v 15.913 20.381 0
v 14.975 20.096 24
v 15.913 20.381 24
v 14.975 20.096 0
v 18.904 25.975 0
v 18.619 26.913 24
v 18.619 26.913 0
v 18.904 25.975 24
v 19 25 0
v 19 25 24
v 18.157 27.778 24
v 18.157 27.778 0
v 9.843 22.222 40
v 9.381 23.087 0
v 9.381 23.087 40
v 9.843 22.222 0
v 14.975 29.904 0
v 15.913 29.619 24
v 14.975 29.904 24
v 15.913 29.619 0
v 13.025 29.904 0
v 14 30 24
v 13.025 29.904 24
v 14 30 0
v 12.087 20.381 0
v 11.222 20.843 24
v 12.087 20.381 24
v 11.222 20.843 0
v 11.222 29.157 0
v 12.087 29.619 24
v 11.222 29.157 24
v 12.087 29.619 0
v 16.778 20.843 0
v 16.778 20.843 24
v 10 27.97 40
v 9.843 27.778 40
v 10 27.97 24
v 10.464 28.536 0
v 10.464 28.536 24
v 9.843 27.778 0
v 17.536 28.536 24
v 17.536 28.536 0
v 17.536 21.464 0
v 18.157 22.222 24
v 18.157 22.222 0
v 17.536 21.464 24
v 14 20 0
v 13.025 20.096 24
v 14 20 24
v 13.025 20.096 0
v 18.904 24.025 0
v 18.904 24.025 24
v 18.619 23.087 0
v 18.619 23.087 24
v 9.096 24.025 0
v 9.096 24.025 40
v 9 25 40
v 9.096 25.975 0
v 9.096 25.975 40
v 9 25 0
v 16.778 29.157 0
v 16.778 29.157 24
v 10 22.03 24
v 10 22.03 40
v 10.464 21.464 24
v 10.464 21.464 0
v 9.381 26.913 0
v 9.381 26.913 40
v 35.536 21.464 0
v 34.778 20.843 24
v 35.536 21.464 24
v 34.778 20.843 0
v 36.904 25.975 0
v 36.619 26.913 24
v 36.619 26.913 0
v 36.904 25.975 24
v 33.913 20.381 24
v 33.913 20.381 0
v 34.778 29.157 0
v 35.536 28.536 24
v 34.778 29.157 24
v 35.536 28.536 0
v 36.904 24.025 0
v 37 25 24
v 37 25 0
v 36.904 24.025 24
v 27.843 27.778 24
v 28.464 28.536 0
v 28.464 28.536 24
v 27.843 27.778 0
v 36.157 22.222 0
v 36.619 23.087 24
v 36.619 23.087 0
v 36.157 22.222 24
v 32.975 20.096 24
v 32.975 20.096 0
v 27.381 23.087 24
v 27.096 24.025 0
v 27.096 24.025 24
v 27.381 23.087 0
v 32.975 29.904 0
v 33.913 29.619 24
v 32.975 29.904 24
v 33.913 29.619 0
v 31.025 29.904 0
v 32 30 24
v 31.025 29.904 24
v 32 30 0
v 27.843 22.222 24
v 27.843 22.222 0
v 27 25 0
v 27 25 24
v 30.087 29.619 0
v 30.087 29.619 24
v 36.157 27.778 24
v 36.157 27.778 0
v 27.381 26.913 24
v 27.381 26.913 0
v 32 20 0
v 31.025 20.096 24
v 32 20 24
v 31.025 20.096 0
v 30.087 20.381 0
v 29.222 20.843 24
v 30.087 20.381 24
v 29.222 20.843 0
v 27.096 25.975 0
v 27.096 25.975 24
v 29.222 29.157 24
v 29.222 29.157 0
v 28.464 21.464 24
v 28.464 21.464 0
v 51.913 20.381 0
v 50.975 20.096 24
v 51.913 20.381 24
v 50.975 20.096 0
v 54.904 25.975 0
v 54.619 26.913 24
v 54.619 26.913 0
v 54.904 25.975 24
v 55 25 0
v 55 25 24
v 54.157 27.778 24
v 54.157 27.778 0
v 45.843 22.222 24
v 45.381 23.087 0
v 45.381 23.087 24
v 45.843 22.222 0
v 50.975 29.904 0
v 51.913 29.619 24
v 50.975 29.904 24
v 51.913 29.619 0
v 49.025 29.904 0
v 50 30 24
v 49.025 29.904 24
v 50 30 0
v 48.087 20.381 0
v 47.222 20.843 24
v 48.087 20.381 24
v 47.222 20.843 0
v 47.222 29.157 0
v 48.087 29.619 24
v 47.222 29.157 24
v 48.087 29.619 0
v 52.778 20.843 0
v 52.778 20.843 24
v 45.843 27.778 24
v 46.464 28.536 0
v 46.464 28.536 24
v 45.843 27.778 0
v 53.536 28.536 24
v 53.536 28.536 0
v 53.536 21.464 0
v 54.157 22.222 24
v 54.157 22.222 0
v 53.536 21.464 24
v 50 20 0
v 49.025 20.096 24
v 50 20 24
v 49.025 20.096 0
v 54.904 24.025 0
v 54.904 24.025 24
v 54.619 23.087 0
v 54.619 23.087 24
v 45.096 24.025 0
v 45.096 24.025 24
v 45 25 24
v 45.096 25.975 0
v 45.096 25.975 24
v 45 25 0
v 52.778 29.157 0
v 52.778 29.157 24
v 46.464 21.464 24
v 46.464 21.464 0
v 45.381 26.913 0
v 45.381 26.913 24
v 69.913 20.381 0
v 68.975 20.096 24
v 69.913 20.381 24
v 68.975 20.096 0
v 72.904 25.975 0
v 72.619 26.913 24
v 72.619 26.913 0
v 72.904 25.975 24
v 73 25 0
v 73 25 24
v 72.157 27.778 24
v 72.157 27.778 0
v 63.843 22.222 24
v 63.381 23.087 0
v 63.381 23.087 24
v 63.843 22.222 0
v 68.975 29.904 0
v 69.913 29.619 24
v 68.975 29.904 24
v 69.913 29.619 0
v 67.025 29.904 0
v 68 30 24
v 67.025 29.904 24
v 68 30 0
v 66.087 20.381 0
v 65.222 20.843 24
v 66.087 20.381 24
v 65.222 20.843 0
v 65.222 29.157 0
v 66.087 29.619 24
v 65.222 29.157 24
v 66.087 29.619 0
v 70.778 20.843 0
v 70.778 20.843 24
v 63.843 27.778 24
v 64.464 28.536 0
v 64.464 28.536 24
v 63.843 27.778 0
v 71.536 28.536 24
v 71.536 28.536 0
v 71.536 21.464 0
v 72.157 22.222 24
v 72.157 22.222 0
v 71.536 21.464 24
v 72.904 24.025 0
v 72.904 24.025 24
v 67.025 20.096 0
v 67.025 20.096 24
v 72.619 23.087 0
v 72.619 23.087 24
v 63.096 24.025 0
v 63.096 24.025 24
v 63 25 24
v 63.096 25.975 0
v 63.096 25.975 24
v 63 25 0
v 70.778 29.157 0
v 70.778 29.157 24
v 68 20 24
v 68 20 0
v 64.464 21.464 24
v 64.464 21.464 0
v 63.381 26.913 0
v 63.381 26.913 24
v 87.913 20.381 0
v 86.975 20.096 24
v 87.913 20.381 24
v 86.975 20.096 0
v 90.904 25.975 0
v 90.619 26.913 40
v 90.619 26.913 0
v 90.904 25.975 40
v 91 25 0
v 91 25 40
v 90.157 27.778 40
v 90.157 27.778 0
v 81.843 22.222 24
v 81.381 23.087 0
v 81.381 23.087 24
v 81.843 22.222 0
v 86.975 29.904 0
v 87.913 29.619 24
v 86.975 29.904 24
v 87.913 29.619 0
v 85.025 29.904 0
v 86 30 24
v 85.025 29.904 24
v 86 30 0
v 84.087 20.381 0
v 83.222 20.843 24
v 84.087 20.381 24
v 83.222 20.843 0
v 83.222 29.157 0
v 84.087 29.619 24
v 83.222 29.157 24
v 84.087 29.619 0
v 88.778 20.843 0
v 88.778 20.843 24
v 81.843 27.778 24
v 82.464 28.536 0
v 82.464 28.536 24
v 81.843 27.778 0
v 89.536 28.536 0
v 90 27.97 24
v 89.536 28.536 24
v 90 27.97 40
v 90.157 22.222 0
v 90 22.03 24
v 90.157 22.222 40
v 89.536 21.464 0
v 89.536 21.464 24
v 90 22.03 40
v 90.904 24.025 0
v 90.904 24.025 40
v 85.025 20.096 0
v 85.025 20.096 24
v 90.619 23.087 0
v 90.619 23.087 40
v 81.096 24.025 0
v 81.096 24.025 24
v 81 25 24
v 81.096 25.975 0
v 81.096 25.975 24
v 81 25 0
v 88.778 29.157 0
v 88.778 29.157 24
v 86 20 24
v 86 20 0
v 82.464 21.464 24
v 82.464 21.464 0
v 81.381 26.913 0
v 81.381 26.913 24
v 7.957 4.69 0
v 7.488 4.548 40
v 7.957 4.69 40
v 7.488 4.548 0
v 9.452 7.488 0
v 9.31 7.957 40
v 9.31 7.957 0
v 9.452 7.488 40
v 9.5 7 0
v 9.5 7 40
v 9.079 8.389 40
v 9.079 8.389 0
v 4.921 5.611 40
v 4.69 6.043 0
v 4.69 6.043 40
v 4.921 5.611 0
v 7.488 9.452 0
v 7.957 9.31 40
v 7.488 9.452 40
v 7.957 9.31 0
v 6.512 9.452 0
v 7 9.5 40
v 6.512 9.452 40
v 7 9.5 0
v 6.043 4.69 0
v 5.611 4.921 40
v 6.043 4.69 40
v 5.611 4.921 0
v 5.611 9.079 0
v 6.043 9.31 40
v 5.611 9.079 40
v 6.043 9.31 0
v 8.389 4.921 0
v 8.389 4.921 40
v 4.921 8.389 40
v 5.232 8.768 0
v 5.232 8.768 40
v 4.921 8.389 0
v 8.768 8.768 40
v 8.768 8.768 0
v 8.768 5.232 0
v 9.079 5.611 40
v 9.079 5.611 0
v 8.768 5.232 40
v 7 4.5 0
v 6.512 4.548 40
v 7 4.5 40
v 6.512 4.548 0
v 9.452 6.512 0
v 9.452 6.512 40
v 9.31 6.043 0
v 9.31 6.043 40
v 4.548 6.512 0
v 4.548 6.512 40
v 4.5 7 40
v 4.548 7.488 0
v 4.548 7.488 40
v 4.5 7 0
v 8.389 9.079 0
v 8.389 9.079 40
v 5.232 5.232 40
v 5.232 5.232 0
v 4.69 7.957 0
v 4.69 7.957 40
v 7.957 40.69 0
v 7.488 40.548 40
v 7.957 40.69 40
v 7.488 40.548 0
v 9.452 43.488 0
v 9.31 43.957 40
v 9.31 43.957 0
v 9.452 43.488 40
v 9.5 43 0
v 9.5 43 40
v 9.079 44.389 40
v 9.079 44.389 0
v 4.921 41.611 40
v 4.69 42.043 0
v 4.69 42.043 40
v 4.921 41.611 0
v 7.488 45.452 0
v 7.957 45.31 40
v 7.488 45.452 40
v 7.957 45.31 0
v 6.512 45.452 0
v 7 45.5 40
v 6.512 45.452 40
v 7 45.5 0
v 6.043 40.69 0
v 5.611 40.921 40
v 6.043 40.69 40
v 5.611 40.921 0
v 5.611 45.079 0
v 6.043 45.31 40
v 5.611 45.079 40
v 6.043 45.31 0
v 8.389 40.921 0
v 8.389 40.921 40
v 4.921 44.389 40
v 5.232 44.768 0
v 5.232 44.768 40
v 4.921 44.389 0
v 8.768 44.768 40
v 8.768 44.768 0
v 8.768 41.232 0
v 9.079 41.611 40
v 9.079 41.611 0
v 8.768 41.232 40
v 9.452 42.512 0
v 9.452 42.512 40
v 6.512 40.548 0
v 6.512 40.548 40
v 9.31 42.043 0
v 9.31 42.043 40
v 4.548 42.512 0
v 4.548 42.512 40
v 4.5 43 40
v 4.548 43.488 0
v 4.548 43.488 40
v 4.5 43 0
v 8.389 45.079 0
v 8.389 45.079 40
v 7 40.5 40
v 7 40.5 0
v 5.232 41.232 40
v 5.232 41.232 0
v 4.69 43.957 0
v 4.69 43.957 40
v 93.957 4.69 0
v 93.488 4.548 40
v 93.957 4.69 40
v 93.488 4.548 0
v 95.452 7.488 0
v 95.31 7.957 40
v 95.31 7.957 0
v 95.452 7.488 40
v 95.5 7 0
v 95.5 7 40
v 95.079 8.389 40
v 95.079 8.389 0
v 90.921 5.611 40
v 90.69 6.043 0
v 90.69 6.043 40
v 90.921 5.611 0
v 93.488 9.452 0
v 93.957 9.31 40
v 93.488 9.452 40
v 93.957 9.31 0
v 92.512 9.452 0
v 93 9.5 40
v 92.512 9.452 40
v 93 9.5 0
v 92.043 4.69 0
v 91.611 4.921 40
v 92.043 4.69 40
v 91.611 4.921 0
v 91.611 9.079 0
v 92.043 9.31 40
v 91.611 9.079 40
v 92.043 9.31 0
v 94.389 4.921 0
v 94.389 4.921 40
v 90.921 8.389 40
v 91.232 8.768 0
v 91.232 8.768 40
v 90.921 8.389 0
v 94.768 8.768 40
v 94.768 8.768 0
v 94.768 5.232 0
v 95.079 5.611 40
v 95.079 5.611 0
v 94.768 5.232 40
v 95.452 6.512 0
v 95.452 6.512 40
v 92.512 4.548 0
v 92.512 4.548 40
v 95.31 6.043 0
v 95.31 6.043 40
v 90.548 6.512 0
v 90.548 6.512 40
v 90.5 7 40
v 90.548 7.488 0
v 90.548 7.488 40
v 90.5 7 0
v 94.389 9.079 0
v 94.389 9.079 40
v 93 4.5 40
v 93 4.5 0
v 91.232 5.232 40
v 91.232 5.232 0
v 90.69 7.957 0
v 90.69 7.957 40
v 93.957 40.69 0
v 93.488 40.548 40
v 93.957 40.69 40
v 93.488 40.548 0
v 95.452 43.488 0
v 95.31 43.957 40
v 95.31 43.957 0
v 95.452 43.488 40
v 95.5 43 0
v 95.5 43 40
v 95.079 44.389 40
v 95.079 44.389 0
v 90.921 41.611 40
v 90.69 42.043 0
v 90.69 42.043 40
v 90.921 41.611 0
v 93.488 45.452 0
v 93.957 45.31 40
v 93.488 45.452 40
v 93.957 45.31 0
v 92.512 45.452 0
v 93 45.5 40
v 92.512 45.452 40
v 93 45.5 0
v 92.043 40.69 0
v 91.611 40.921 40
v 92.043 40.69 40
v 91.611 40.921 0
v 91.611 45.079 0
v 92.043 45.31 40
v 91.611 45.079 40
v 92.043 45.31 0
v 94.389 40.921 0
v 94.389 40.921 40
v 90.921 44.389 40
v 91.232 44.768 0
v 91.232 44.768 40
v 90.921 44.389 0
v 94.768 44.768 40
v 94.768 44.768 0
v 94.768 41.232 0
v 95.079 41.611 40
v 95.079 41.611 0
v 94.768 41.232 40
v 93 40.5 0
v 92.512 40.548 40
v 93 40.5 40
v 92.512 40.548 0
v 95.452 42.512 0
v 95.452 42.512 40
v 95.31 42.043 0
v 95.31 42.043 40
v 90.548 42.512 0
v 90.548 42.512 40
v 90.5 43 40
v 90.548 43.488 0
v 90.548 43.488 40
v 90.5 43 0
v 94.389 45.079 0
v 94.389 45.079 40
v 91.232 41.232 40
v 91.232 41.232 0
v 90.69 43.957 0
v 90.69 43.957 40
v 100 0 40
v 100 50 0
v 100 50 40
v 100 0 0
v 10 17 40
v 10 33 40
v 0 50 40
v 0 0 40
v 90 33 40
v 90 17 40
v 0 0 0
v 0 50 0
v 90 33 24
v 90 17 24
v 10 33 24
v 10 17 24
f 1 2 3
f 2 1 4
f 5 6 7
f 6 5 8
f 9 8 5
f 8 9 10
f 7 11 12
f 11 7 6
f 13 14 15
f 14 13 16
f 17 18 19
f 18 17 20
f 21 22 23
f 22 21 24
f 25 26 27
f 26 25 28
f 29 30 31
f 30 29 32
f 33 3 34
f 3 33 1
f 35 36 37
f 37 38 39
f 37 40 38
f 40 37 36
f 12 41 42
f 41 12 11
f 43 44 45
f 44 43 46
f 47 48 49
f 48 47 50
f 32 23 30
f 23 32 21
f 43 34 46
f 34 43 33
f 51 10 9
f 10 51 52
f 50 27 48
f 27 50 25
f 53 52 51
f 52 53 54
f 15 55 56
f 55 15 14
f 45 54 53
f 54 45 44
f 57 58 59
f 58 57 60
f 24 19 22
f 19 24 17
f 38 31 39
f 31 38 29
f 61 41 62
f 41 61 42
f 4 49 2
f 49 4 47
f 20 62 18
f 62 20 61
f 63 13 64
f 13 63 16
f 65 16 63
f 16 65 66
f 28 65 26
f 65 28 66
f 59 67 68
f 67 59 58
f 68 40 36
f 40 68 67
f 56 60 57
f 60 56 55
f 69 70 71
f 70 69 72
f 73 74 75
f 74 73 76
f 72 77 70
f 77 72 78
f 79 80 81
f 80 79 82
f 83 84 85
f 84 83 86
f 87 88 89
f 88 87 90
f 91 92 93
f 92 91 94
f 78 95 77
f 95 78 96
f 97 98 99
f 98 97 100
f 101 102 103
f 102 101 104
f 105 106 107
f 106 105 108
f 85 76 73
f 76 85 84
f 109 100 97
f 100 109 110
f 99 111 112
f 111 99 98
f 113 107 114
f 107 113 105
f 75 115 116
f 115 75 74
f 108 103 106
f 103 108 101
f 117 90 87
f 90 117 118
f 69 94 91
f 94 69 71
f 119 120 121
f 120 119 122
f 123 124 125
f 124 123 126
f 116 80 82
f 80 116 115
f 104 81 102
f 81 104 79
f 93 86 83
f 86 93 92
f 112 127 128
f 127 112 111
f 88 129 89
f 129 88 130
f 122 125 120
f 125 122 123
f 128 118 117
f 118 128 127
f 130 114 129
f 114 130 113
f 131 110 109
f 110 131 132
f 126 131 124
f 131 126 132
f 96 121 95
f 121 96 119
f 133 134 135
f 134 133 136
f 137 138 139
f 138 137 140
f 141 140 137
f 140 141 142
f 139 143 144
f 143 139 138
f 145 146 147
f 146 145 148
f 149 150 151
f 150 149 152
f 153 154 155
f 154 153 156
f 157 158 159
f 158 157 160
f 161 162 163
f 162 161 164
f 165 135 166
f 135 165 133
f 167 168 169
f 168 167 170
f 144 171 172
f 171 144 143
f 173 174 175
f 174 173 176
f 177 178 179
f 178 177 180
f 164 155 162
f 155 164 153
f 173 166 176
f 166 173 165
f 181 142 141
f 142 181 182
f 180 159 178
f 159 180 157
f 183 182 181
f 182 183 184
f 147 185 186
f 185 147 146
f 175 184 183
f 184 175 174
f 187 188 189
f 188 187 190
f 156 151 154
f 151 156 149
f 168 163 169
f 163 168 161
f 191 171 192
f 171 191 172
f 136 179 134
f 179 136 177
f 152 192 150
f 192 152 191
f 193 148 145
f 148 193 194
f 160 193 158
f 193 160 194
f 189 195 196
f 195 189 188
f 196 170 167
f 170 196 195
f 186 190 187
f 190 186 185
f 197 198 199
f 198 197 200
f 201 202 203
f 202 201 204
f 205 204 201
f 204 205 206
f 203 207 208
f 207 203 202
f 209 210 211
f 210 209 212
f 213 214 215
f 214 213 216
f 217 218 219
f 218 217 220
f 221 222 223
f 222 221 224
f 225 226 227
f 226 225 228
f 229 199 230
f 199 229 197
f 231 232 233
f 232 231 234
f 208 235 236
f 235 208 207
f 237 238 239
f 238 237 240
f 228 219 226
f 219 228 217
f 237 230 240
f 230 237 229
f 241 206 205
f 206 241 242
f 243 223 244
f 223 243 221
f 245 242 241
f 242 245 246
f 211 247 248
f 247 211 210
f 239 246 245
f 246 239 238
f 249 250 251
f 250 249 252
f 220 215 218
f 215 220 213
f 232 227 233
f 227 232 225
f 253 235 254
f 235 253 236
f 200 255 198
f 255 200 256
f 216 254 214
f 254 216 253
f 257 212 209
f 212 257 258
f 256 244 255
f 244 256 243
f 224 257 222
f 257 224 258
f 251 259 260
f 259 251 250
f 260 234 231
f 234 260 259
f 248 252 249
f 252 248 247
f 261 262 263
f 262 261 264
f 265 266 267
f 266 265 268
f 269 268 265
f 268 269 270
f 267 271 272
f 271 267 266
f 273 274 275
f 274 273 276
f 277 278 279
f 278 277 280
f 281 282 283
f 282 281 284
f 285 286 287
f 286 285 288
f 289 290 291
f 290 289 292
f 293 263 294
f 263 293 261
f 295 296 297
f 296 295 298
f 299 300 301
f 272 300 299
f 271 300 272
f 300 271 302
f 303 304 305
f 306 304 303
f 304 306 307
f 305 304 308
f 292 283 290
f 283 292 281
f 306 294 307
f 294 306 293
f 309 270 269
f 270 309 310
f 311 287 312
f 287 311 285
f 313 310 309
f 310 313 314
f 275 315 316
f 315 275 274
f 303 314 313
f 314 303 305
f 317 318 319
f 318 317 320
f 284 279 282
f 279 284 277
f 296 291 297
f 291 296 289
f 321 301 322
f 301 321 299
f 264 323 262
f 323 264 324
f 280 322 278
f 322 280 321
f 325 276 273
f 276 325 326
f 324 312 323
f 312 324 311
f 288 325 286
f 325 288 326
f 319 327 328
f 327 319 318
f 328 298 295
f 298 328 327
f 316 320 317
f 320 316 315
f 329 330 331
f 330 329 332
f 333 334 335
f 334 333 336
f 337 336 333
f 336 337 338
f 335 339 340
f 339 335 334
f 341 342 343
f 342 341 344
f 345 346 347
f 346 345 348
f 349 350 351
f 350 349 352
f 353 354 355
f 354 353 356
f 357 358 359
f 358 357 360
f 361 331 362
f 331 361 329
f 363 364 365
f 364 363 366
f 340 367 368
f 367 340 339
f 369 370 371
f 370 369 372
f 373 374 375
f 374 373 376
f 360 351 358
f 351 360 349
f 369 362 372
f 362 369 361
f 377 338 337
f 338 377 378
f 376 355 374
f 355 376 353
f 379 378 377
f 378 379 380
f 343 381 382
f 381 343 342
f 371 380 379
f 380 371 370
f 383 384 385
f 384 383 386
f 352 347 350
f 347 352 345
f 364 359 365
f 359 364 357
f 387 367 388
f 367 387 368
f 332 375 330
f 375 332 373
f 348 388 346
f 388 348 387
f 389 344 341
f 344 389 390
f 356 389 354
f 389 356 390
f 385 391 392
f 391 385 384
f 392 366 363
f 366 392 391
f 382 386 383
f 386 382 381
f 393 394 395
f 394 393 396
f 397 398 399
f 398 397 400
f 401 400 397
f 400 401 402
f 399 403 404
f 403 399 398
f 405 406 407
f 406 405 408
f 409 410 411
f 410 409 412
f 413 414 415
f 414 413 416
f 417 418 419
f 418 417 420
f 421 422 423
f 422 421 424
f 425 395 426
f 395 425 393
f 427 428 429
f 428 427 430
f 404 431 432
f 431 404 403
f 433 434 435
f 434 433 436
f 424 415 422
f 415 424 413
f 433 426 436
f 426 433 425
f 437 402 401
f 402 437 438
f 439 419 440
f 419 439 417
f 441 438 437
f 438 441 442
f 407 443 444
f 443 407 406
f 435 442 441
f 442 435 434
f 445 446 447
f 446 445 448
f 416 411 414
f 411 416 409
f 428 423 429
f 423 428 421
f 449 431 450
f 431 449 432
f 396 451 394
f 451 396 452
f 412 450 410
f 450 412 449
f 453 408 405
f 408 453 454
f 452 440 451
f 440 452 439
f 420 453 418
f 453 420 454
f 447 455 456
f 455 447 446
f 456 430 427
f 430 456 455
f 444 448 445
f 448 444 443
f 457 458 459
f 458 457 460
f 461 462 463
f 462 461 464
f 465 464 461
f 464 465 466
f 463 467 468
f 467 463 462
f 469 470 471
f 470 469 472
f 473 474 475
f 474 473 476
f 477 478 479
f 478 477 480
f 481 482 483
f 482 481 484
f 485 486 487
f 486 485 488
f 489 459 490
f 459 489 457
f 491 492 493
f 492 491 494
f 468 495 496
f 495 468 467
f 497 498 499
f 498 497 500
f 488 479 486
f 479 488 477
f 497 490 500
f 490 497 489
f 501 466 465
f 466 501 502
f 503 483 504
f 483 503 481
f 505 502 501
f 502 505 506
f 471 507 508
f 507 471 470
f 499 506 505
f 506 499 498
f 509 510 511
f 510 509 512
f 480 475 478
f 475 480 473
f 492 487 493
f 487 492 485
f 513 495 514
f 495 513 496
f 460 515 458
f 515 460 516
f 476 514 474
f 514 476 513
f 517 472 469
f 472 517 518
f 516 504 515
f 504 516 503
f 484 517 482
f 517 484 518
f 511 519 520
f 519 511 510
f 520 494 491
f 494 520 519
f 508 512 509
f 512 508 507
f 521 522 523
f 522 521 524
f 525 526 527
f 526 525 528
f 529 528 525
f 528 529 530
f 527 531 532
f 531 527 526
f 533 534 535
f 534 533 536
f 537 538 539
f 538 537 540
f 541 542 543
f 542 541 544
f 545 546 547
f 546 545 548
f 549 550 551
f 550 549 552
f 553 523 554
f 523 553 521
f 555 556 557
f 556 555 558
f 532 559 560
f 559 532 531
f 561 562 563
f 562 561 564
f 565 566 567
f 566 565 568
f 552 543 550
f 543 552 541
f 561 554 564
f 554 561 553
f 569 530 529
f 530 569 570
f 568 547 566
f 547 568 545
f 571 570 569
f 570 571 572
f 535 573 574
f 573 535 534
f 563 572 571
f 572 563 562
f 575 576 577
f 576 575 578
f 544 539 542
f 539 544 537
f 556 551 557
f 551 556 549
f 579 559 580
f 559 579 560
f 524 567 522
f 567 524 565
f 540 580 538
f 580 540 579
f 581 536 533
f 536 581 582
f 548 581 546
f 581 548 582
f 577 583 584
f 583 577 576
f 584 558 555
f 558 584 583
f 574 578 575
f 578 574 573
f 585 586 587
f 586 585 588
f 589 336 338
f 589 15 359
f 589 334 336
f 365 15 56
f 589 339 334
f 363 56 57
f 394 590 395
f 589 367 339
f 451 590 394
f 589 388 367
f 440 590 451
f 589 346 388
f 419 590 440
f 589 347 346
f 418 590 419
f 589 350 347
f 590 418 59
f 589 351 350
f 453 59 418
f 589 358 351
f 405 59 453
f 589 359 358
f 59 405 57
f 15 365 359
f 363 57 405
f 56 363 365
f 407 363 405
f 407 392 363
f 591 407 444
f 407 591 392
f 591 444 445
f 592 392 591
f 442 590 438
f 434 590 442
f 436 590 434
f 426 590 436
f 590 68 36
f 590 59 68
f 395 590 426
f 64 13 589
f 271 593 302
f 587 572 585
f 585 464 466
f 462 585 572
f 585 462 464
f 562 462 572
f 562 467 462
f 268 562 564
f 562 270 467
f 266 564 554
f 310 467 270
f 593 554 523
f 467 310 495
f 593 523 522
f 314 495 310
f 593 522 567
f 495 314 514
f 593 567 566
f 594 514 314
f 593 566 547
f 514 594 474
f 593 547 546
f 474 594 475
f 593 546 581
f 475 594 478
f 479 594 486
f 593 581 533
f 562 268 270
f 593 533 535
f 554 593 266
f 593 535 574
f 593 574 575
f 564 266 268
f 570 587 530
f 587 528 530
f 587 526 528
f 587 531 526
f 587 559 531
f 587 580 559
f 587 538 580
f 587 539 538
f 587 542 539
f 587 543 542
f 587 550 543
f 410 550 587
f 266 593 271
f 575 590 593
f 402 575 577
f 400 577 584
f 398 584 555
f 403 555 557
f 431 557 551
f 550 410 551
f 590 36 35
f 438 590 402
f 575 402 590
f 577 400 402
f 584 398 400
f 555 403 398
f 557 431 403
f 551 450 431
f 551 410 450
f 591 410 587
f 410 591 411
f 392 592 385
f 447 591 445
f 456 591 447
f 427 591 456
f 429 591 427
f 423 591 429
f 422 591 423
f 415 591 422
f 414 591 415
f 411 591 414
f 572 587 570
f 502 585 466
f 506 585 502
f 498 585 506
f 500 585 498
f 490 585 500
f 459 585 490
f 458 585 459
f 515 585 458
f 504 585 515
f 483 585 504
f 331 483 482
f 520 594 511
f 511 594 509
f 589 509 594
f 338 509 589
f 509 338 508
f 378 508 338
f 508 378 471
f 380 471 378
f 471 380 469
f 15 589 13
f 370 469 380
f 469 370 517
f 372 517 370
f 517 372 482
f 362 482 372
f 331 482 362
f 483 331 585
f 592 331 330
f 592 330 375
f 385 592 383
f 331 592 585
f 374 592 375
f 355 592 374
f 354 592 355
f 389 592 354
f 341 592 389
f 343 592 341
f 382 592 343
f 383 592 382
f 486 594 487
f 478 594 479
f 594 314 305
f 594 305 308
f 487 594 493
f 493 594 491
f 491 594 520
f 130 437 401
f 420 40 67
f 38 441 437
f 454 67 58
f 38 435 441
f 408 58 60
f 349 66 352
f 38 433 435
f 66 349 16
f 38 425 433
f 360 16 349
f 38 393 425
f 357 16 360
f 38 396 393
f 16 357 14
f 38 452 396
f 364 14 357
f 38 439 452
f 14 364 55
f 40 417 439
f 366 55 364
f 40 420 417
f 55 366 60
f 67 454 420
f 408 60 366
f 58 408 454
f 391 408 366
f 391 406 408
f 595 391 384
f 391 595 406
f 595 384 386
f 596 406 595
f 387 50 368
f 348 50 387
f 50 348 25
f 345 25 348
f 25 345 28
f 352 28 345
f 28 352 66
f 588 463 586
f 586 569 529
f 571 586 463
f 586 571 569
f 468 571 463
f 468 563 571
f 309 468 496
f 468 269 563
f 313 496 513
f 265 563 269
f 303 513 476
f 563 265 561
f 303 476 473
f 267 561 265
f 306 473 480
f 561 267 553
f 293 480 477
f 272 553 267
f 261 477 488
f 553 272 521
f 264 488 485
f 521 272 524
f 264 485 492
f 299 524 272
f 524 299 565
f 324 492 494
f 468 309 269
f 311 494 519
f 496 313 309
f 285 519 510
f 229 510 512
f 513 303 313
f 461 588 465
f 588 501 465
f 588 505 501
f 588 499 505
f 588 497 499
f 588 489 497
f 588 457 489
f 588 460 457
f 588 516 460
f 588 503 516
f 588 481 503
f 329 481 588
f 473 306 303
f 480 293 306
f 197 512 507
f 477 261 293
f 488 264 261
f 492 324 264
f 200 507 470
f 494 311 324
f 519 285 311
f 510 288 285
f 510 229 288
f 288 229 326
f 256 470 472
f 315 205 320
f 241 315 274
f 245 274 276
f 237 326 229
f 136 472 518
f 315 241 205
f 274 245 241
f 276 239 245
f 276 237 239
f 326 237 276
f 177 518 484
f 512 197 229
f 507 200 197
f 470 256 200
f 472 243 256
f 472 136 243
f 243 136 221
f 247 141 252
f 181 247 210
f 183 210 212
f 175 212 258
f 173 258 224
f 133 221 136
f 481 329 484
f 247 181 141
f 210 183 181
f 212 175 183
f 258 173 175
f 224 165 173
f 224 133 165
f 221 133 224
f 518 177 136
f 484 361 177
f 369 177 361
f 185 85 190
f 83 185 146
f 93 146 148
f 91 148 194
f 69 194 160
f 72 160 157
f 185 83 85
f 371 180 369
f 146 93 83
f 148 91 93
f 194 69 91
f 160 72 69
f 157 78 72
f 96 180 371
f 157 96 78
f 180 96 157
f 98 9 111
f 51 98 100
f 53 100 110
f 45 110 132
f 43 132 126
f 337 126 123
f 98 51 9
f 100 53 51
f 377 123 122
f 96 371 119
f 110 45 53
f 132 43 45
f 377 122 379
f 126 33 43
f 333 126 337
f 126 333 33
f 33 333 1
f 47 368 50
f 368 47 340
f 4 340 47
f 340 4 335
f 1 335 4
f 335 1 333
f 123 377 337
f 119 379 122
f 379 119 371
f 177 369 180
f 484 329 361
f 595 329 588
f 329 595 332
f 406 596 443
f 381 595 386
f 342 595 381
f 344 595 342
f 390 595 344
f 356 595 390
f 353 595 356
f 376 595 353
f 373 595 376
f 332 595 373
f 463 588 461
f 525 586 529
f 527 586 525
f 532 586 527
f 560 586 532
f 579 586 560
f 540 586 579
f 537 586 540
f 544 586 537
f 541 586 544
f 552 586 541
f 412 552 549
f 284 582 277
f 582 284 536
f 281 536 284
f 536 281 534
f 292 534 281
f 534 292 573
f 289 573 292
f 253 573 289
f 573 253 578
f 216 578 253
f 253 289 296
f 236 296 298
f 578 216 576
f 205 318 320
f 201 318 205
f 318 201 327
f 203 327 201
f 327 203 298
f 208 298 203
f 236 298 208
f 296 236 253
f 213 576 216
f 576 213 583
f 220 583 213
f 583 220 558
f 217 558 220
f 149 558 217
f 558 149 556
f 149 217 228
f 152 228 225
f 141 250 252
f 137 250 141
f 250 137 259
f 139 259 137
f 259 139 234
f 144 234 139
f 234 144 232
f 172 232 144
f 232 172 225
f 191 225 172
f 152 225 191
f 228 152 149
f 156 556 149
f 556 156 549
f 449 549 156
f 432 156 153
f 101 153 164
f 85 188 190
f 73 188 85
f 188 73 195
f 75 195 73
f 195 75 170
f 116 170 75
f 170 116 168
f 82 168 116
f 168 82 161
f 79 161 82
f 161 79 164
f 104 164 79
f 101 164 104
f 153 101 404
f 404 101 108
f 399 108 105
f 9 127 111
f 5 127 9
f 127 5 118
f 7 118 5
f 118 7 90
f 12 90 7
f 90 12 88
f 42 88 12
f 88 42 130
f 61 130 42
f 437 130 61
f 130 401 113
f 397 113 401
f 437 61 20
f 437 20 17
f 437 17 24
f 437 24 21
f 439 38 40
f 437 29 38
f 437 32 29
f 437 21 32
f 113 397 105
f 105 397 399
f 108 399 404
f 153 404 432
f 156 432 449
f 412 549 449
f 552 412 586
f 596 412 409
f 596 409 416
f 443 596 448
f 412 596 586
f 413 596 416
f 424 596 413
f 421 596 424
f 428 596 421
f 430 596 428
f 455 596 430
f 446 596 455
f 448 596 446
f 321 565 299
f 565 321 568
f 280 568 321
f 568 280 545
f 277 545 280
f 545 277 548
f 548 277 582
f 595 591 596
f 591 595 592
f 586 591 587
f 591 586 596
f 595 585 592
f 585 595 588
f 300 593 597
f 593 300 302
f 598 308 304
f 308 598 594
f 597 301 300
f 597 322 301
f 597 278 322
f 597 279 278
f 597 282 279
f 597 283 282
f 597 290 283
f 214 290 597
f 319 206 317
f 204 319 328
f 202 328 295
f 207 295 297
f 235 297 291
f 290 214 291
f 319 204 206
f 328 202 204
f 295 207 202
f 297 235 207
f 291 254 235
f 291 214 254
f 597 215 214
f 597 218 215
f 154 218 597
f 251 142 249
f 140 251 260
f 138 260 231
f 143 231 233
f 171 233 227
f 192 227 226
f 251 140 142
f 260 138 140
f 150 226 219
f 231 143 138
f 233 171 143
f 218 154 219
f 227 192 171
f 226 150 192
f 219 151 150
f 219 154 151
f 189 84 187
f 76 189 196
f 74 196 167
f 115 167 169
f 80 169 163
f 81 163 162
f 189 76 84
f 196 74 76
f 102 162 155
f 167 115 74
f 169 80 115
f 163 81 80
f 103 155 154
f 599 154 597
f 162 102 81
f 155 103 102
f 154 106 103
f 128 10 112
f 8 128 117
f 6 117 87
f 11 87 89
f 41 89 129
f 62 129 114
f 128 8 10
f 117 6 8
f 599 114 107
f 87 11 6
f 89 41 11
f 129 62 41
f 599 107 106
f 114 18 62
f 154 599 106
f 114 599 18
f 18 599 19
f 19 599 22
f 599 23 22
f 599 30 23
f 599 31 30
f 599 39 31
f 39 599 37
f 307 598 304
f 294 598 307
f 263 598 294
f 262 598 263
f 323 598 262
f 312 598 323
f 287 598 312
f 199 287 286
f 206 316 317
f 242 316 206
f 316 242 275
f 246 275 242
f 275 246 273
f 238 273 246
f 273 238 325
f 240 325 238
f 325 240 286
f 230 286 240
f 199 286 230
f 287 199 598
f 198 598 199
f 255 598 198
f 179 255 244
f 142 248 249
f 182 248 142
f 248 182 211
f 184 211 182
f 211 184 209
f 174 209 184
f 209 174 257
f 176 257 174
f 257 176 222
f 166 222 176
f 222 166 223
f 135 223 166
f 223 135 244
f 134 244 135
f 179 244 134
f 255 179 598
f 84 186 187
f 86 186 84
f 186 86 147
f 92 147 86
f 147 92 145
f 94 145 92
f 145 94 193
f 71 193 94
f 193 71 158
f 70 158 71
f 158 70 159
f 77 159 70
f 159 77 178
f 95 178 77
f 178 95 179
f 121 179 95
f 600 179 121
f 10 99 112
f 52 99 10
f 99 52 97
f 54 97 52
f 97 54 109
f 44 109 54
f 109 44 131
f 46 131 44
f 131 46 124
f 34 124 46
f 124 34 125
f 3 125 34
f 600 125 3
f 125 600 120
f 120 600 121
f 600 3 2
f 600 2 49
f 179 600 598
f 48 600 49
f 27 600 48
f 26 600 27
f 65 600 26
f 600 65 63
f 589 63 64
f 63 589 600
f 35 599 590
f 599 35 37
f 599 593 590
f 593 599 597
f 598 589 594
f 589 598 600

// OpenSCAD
$fn = 32;

// ----------------------------------------------------------------------
// Manifold block: gallery_top manifold
// ----------------------------------------------------------------------

// --- parameters (mm) ---
block_l = 100;            // block length, X
block_w = 50;             // block width, Y
block_h = 40;             // block height, Z
port_d = 10;              // port bore diameter
port_pitch = 18;          // port pitch along X
gallery_d = 16;           // top gallery width, Y
gallery_depth = 16;       // gallery pocket depth
wall_p = 10;              // gallery end wall thickness, X
mnt_d = 5;                // mounting hole diameter
mnt_in = 7;               // mounting hole inset from the edges

n_ports = 5;  // ports in the row
port_x0 = (block_l - (n_ports - 1) * port_pitch) / 2;  // first port X

difference() {
  cube([block_l, block_w, block_h]);
  for (i = [0 : n_ports - 1])
    translate([port_x0 + i * port_pitch, block_w / 2, -1])
      cylinder(h = block_h + 2, d = port_d);
  translate([wall_p, block_w / 2 - gallery_d / 2, block_h - gallery_depth])
    cube([block_l - 2 * wall_p, gallery_d, gallery_depth + 1]);
  for (cx = [mnt_in, block_l - mnt_in])
    for (cy = [mnt_in, block_w - mnt_in])
      translate([cx, cy, -1]) cylinder(h = block_h + 2, d = mnt_d);
}
